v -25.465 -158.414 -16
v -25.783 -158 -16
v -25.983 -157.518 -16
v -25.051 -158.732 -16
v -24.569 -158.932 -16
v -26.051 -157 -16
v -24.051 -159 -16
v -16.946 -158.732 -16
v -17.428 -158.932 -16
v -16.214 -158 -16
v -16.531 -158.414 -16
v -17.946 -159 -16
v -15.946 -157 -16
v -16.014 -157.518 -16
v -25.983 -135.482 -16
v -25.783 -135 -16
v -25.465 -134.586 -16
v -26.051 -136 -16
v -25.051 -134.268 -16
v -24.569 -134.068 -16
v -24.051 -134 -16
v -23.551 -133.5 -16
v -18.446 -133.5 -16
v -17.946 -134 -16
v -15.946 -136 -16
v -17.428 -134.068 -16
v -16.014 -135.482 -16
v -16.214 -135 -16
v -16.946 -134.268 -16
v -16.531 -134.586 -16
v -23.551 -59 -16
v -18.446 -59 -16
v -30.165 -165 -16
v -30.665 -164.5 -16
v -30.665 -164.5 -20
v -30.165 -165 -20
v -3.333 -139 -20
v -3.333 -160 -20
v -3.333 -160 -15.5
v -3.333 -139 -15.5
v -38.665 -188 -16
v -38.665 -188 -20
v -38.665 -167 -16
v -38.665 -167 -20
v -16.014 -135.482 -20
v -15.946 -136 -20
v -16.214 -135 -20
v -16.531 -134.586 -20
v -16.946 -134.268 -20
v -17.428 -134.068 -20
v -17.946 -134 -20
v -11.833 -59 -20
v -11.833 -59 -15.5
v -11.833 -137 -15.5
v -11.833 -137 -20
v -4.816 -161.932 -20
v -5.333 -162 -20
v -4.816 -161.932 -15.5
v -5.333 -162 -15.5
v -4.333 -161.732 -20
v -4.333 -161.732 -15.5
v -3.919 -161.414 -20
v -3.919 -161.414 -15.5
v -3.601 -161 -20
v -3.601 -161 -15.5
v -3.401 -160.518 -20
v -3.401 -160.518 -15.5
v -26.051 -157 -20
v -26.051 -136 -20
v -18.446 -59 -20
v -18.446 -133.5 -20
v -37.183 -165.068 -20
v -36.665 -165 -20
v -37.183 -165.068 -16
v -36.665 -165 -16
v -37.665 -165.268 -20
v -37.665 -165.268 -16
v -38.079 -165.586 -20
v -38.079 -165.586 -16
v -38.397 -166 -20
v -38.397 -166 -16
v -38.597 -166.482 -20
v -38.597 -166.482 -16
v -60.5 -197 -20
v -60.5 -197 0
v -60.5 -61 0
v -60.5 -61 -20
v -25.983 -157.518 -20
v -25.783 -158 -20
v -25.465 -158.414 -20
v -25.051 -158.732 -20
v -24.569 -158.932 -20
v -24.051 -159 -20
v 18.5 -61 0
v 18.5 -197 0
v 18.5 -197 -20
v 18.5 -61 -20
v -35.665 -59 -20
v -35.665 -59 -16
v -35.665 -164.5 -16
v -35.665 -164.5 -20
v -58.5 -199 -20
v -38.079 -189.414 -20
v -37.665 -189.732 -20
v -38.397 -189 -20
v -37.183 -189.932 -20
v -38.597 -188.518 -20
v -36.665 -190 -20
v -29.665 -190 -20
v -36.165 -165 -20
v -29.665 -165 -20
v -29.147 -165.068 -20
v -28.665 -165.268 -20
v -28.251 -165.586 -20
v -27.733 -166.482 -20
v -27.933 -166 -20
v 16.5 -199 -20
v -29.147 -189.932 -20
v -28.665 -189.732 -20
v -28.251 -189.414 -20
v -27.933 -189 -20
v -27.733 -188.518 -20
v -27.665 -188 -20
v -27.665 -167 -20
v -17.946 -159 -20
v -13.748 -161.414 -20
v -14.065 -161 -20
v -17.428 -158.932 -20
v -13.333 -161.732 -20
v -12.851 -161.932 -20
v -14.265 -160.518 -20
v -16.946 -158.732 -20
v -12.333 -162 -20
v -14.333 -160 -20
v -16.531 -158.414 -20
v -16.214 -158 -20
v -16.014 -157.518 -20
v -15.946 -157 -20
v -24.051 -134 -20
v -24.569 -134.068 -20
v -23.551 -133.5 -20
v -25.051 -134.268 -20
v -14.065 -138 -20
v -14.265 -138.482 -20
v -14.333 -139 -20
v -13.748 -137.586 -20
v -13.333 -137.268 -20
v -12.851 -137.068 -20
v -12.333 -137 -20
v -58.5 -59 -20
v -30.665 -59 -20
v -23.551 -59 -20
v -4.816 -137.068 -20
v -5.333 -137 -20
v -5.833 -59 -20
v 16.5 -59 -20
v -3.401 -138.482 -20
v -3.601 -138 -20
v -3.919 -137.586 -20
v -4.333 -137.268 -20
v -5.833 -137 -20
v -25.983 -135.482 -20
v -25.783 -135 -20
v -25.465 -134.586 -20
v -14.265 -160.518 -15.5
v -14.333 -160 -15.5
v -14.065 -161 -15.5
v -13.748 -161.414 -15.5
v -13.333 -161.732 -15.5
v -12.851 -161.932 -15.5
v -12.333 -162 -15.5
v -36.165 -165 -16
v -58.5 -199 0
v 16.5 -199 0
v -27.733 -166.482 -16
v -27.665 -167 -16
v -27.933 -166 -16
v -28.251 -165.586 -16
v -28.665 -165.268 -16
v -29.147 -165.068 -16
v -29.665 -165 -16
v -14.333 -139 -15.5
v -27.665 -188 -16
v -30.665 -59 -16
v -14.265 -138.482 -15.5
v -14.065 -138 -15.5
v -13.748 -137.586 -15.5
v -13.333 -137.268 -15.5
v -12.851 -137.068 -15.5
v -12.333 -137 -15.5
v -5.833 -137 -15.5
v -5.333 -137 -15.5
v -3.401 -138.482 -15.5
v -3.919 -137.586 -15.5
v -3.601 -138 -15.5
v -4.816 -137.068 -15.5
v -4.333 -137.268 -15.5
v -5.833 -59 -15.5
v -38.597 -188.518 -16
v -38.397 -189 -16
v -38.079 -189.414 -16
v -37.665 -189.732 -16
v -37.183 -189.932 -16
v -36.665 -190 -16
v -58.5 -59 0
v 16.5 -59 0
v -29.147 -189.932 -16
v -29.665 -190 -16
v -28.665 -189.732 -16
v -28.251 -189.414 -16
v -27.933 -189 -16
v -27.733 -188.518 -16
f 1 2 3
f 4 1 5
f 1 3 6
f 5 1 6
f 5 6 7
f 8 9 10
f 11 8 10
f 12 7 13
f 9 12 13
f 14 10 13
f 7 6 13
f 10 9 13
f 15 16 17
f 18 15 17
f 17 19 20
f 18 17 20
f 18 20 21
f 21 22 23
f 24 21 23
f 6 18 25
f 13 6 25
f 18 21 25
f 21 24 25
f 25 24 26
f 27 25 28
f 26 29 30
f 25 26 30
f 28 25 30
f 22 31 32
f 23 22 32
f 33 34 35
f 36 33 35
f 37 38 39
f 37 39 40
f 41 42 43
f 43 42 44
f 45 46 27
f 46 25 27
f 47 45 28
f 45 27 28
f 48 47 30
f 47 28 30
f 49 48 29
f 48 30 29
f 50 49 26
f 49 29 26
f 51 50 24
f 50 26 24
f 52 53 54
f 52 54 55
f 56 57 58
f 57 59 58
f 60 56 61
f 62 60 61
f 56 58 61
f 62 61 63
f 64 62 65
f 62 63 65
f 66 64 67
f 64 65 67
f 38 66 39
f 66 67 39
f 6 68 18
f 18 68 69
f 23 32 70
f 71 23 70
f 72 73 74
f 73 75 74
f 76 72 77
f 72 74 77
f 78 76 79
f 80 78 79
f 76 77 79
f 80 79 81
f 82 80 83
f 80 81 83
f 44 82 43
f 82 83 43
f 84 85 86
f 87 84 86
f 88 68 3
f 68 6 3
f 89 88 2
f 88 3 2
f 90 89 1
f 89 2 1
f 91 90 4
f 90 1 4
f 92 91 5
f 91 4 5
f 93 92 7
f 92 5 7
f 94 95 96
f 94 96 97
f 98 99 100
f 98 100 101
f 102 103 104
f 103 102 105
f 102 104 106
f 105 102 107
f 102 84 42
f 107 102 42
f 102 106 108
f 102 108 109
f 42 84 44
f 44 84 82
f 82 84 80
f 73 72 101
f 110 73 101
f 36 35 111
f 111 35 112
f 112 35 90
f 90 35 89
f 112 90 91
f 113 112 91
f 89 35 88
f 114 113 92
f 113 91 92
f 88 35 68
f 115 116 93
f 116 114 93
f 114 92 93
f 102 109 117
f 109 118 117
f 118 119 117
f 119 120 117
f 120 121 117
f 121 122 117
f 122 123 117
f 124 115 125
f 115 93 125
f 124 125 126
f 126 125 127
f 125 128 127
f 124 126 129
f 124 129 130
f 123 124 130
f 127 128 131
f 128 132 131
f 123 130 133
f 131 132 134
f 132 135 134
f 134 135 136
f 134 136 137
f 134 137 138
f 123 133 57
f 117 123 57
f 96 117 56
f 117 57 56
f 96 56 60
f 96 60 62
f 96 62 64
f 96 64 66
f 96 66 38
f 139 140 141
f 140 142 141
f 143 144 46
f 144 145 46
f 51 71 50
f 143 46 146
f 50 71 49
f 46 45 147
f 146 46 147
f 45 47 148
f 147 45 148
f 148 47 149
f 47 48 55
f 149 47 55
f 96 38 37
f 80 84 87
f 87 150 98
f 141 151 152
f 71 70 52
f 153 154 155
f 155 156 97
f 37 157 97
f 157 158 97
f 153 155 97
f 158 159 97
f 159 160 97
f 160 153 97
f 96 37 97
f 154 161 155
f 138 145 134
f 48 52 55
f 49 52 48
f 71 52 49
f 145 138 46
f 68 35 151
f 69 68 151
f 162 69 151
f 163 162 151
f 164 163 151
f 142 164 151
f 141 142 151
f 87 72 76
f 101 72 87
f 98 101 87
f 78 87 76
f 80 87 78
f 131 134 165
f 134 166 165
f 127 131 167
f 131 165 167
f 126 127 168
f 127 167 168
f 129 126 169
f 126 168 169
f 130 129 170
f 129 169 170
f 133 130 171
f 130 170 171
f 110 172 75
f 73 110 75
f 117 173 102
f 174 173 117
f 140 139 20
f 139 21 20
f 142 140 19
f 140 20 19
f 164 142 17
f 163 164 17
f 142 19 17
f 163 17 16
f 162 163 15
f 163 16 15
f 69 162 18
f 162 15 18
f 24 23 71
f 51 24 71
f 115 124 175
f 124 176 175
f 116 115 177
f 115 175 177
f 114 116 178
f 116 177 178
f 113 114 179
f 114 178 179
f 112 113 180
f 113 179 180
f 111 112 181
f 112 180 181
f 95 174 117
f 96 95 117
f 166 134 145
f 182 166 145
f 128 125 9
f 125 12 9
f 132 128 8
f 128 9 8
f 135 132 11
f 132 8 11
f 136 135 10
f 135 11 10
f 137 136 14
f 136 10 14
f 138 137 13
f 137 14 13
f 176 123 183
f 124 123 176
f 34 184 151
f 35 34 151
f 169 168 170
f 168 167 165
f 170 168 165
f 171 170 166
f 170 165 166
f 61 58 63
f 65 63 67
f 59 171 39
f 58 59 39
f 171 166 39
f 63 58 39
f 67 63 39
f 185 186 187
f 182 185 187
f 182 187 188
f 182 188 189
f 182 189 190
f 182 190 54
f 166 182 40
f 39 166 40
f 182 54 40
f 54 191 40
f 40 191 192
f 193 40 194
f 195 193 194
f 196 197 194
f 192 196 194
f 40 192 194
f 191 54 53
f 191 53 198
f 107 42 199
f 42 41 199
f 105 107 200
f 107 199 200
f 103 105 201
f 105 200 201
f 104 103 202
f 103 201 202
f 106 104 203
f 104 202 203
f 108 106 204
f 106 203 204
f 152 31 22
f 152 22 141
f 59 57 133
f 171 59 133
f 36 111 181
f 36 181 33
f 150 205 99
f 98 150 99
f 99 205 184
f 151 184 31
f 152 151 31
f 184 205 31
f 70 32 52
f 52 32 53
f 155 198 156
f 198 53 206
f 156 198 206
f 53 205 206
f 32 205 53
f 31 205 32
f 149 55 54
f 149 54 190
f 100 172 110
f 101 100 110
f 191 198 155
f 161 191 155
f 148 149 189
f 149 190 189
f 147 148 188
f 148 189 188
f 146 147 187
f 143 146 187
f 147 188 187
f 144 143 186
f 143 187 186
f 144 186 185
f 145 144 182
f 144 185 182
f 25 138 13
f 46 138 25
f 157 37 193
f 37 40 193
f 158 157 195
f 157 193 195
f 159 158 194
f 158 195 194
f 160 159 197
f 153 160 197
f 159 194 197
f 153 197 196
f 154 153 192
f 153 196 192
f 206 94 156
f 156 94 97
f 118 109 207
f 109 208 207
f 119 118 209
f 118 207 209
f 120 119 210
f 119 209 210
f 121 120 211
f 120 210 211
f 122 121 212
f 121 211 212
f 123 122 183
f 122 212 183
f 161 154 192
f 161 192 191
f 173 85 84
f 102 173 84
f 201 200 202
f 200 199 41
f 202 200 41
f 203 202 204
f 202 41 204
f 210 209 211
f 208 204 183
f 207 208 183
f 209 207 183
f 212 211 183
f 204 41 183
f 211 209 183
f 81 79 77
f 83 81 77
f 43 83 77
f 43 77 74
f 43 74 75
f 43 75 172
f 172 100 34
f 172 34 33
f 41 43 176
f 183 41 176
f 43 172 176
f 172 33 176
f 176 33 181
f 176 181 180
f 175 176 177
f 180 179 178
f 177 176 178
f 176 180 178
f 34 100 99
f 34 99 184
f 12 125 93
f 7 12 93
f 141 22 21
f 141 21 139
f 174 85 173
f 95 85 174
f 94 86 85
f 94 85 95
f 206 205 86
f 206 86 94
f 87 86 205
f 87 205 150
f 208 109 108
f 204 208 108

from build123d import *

# Parameters (mm, degrees)
SKETCH1_W           = 79
SKETCH1_H           = 140
BOSS_EXTRUDE1_DEPTH = 20
SKETCH3_W           = 5
SKETCH3_H           = 5
CUT_EXTRUDE1_DEPTH  = 131
SKETCH4_W           = 11
SKETCH4_H           = 25
CUT_EXTRUDE2_DEPTH  = 4
FILLET1_R           = 2
CHAMFER1_SIZE       = 0.5
SKETCH6_W           = 5.105326573
SKETCH6_H           = 5
CUT_EXTRUDE3_DEPTH  = 100
SKETCH7_W           = 10.105326573
SKETCH7_H           = 25
CUT_EXTRUDE4_DEPTH  = 4
FILLET2_R           = 2
CHAMFER2_SIZE       = 0.5
SKETCH8_W           = 6
SKETCH8_H           = 6
CUT_EXTRUDE5_DEPTH  = 103
SKETCH9_W           = 11
SKETCH9_H           = 25
CUT_EXTRUDE6_DEPTH  = 4.5
FILLET3_R           = 2
CHAMFER3_SIZE       = 2


with BuildPart() as part:
    # Sketch1 → Boss-Extrude1 (new body)
    with BuildSketch(Plane.XY):
        with Locations((-21, -129)):
            Rectangle(SKETCH1_W, SKETCH1_H)
    extrude(amount=-BOSS_EXTRUDE1_DEPTH)

    # Sketch3 → Cut-Extrude1 (cut)
    with BuildSketch(Plane(origin=(0, -59, 0), x_dir=(1, 0, 0), z_dir=(0, 1, 0))):
        with Locations((-33.165, 18.5)):
            Rectangle(SKETCH3_W, SKETCH3_H)
    extrude(amount=-CUT_EXTRUDE1_DEPTH, mode=Mode.SUBTRACT)

    # Sketch4 → Cut-Extrude2 (cut)
    with BuildSketch(Plane(origin=(0, 0, -20), x_dir=(-1, 0, 0), z_dir=(0, 0, -1))):
        with Locations((33.165, -177.5)):
            Rectangle(SKETCH4_W, SKETCH4_H)
    extrude(amount=-CUT_EXTRUDE2_DEPTH, mode=Mode.SUBTRACT)

    # Fillet1
    fillet1_edges = [part.edges().sort_by_distance(p)[0] for p in [
        (-38.665, -190, -18),
        (-27.665, -165, -18),
        (-38.665, -165, -18),
        (-27.665, -190, -18),
    ]]
    fillet(fillet1_edges, radius=FILLET1_R)

    # Chamfer1
    chamfer1_edges = [part.edges().sort_by_distance(p)[0] for p in [
        (-30.665, -165, -18),
        (-35.665, -165, -18),
    ]]
    chamfer(chamfer1_edges, length=CHAMFER1_SIZE)

    # Sketch6 → Cut-Extrude3 (cut)
    with BuildSketch(Plane(origin=(0, -59, 0), x_dir=(1, 0, 0), z_dir=(0, 1, 0))):
        with Locations((-20.998333333, 18.5)):
            Rectangle(SKETCH6_W, SKETCH6_H)
    extrude(amount=-CUT_EXTRUDE3_DEPTH, mode=Mode.SUBTRACT)

    # Sketch7 → Cut-Extrude4 (cut)
    with BuildSketch(Plane(origin=(0, 0, -20), x_dir=(-1, 0, 0), z_dir=(0, 0, -1))):
        with Locations((20.998333333, -146.5)):
            Rectangle(SKETCH7_W, SKETCH7_H)
    extrude(amount=-CUT_EXTRUDE4_DEPTH, mode=Mode.SUBTRACT)

    # Fillet2
    fillet2_edges = [part.edges().sort_by_distance(p)[0] for p in [
        (-26.05099662, -159, -18),
        (-15.945670047, -134, -18),
        (-26.05099662, -134, -18),
        (-15.945670047, -159, -18),
    ]]
    fillet(fillet2_edges, radius=FILLET2_R)

    # Chamfer2
    chamfer2_edges = [part.edges().sort_by_distance(p)[0] for p in [
        (-23.55099662, -134, -18),
        (-18.445670047, -134, -18),
    ]]
    chamfer(chamfer2_edges, length=CHAMFER2_SIZE - 0.0001)  # a hair under: the kernel refuses the full size

    # Sketch8 → Cut-Extrude5 (cut)
    with BuildSketch(Plane(origin=(0, -59, 0), x_dir=(1, 0, 0), z_dir=(0, 1, 0))):
        with Locations((-8.833333333, 18.5)):
            Rectangle(SKETCH8_W, SKETCH8_H)
    extrude(amount=-CUT_EXTRUDE5_DEPTH, mode=Mode.SUBTRACT)

    # Sketch9 → Cut-Extrude6 (cut)
    with BuildSketch(Plane(origin=(0, 0, -20), x_dir=(-1, 0, 0), z_dir=(0, 0, -1))):
        with Locations((8.833333333, -149.5)):
            Rectangle(SKETCH9_W, SKETCH9_H)
    extrude(amount=-CUT_EXTRUDE6_DEPTH, mode=Mode.SUBTRACT)

    # Fillet3
    fillet3_edges = [part.edges().sort_by_distance(p)[0] for p in [
        (-14.333333333, -162, -17.75),
        (-3.333333333, -137, -17.75),
        (-14.333333333, -137, -17.75),
        (-3.333333333, -162, -17.75),
    ]]
    fillet(fillet3_edges, radius=FILLET3_R)

    # Chamfer3
    chamfer3_edges = [part.edges().sort_by_distance(p)[0] for p in [
        (-60.5, -59, -10),
        (18.5, -59, -10),
        (18.5, -199, -10),
        (-60.5, -199, -10),
    ]]
    chamfer(chamfer3_edges, length=CHAMFER3_SIZE)


solid = part.part
